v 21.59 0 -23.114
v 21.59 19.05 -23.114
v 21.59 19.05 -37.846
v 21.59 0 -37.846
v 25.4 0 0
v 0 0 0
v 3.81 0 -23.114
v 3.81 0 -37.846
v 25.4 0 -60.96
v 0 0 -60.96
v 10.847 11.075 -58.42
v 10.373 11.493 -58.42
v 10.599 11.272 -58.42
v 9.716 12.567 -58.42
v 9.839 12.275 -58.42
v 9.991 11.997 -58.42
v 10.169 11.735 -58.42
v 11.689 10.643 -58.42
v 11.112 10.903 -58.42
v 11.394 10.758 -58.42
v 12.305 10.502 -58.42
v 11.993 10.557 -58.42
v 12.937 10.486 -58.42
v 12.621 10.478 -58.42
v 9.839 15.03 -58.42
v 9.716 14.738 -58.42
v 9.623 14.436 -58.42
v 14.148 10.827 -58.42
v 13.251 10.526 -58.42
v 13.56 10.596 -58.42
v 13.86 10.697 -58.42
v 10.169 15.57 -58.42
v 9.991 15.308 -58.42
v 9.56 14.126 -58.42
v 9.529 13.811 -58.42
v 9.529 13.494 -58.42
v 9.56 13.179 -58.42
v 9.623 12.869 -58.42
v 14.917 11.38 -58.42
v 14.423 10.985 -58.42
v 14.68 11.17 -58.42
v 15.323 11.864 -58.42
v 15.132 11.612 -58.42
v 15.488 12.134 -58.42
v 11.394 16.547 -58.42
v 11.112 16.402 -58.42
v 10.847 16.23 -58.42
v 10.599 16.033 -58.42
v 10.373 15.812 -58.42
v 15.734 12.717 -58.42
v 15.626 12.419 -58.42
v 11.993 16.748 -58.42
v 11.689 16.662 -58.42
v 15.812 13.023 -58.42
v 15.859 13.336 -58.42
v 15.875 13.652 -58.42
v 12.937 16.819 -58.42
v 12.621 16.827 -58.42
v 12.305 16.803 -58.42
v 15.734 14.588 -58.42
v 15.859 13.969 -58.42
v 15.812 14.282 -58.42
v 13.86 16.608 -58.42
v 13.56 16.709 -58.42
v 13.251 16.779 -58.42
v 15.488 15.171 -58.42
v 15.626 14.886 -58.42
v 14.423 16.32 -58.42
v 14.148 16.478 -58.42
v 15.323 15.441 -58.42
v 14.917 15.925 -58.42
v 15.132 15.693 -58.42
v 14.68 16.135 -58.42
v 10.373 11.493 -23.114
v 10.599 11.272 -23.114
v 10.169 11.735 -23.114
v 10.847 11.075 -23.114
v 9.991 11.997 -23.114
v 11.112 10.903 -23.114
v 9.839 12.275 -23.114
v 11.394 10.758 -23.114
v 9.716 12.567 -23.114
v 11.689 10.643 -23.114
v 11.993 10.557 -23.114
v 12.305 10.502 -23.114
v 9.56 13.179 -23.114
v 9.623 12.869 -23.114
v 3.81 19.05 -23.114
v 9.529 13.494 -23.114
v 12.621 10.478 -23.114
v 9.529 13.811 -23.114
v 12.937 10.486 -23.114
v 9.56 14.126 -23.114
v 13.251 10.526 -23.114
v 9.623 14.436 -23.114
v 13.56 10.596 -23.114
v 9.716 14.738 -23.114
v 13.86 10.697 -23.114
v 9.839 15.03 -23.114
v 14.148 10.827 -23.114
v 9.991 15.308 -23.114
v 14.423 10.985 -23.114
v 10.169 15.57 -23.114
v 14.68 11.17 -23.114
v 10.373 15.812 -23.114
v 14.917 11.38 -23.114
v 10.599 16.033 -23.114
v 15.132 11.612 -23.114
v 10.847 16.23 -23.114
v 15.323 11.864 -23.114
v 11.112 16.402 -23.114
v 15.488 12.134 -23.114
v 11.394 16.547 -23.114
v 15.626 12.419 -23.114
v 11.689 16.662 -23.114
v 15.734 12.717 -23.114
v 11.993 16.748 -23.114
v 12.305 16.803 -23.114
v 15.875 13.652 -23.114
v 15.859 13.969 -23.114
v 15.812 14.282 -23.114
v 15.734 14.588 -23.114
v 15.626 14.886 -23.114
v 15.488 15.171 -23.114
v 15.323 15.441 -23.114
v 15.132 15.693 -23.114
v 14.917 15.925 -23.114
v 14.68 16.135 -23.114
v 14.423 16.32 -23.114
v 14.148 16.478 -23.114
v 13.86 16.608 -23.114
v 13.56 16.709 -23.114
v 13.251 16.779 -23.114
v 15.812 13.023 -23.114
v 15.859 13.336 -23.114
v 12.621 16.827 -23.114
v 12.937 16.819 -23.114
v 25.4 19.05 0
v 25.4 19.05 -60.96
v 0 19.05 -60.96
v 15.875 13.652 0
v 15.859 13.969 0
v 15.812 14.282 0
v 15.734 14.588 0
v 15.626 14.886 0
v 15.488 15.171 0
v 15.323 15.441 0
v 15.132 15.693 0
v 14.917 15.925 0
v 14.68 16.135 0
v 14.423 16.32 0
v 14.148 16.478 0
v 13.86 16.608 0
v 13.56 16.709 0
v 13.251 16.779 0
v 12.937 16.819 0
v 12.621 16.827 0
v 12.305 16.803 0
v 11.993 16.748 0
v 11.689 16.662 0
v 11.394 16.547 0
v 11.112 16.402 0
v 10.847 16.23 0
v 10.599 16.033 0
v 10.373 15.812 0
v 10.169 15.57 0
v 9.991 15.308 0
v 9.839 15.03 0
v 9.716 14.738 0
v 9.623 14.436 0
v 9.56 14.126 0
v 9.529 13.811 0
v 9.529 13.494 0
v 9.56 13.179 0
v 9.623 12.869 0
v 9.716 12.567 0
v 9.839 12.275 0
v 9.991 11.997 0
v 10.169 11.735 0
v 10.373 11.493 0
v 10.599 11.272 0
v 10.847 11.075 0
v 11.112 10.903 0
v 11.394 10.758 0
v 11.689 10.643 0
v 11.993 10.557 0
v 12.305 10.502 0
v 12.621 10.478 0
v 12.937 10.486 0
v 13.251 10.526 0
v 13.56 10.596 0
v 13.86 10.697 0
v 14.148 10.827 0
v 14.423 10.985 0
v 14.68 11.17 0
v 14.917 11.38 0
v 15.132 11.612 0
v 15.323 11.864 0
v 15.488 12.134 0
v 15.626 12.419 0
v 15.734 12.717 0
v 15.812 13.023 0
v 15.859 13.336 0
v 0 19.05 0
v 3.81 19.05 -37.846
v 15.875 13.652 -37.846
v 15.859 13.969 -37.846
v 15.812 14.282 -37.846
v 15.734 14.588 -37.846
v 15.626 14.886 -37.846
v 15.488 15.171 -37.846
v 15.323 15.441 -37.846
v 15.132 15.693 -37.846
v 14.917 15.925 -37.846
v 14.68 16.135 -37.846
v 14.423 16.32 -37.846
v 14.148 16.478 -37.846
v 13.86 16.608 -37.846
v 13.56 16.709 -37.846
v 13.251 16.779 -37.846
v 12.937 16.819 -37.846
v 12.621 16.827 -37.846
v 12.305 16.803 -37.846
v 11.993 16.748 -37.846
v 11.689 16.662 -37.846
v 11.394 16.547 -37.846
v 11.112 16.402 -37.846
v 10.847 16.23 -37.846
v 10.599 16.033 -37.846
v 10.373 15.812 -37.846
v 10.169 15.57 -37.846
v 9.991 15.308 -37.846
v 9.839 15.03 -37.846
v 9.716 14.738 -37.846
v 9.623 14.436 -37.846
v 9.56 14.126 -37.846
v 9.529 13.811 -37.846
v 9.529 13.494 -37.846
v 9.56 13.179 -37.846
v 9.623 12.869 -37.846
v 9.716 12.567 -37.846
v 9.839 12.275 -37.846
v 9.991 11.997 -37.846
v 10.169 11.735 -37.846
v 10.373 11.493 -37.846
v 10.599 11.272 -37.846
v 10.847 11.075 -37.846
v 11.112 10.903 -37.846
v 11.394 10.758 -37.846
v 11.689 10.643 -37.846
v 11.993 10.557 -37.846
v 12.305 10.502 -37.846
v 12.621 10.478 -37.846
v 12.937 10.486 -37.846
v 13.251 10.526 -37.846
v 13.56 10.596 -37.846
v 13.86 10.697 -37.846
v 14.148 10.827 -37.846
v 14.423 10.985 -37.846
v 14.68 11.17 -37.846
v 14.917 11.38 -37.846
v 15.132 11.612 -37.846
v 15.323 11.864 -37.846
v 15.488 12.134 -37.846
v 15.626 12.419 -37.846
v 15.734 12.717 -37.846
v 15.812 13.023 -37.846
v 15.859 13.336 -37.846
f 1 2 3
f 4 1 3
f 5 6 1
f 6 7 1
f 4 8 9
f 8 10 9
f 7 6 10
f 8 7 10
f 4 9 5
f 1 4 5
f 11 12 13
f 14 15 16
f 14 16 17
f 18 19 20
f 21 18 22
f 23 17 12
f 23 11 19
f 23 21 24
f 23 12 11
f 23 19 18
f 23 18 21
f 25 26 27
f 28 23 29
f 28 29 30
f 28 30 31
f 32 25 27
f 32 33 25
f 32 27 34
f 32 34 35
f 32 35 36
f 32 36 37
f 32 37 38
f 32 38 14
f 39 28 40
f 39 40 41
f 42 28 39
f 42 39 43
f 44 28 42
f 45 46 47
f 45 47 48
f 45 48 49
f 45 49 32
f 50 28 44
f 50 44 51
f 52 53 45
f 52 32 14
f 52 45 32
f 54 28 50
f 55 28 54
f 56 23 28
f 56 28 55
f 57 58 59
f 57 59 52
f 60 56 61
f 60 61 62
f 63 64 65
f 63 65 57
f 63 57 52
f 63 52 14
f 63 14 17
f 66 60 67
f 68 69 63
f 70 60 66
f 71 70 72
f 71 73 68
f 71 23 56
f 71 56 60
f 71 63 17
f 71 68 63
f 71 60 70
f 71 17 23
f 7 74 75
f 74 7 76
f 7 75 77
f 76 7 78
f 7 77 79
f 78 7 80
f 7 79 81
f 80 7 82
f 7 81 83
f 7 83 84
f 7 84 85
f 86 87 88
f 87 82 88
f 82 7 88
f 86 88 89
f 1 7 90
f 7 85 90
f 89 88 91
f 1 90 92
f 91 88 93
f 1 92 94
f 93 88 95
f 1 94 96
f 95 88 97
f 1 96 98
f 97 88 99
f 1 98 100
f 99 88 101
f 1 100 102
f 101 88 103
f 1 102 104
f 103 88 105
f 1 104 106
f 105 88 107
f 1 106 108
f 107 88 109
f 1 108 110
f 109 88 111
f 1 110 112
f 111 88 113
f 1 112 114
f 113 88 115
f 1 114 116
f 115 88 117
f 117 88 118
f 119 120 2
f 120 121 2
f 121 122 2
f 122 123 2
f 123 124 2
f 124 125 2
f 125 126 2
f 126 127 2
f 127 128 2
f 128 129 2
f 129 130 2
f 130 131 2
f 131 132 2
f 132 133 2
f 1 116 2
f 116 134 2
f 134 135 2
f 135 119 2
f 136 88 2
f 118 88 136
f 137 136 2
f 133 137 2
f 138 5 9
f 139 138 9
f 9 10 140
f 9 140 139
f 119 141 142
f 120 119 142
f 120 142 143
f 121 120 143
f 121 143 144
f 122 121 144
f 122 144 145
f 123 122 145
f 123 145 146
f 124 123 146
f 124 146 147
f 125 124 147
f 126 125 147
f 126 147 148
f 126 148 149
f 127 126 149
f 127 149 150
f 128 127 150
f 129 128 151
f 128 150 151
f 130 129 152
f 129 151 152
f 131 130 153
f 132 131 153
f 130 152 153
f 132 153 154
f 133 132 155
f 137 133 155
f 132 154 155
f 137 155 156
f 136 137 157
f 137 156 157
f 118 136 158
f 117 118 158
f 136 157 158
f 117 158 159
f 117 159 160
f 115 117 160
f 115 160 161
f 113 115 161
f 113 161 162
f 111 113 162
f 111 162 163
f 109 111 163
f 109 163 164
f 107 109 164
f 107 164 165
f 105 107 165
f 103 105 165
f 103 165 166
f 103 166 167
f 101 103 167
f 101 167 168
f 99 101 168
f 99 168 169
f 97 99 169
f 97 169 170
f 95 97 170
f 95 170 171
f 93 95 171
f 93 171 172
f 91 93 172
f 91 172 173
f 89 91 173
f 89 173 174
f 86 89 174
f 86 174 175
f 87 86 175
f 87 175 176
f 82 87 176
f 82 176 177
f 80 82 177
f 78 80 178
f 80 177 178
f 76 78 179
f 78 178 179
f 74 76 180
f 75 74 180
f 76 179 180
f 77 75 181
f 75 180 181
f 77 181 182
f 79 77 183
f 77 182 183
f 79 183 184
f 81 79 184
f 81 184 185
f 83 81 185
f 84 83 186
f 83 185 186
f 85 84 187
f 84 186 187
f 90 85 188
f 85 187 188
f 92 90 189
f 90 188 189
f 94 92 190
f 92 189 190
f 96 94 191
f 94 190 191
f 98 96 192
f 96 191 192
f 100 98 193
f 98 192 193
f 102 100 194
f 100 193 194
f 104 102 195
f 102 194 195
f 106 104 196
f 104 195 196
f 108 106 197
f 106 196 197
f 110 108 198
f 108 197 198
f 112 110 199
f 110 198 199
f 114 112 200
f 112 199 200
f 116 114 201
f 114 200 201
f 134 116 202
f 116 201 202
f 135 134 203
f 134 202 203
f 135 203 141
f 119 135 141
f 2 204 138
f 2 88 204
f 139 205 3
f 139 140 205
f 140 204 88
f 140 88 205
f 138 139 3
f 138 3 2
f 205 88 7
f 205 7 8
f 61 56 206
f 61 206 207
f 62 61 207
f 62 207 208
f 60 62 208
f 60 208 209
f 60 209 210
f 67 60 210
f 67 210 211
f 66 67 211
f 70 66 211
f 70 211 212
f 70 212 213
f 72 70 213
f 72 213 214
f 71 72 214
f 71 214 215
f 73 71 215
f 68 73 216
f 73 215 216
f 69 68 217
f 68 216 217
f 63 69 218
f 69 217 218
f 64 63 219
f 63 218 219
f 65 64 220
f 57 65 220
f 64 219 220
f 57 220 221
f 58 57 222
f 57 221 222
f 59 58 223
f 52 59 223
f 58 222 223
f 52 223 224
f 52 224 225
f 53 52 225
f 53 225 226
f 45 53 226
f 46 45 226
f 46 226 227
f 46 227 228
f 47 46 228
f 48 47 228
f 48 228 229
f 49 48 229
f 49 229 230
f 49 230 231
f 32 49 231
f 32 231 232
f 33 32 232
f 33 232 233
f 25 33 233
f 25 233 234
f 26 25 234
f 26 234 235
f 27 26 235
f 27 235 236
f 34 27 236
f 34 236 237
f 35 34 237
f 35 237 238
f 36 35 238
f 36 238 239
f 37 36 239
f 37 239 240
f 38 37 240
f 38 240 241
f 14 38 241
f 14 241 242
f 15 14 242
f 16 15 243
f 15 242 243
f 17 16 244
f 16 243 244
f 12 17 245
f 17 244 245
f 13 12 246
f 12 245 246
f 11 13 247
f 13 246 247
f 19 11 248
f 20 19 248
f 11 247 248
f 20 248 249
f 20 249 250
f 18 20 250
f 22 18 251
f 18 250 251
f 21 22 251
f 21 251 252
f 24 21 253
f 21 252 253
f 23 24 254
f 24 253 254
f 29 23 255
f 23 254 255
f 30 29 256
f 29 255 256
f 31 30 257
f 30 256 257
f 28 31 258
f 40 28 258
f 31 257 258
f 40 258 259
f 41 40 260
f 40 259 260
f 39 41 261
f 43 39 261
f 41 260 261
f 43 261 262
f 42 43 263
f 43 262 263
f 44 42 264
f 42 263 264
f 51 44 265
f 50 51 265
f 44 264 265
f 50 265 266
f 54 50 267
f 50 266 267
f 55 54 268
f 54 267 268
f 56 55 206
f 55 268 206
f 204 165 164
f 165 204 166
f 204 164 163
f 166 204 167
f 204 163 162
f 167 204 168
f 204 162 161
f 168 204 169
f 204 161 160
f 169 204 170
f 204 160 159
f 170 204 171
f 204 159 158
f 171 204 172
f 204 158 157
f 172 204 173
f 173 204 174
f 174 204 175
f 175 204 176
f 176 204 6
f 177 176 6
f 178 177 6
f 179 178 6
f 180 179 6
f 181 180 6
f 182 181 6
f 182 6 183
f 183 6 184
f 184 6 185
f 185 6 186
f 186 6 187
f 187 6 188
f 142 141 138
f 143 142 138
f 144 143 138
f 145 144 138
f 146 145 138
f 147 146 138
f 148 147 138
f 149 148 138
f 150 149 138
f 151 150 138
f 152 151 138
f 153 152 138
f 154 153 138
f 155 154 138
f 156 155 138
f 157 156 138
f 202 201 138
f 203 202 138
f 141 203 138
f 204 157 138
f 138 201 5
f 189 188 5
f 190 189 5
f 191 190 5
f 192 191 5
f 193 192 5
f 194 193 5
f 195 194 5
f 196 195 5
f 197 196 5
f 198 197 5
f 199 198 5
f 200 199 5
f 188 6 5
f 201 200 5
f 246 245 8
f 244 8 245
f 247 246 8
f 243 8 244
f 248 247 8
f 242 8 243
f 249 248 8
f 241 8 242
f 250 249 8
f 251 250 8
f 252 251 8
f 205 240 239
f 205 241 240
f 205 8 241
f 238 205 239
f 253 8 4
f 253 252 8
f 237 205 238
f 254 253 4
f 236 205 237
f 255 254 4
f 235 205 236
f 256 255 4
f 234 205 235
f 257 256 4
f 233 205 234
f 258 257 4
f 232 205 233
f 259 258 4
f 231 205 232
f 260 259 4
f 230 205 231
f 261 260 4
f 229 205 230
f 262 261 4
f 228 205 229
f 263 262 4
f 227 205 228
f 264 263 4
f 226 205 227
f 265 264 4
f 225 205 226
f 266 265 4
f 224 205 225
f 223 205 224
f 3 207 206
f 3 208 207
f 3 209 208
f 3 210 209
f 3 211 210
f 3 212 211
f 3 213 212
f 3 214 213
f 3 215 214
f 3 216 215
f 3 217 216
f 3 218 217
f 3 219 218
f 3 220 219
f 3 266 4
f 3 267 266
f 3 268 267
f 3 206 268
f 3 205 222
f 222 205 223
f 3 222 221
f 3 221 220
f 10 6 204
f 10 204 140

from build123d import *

# Parameters (mm, degrees)
SKETCH1_W           = 25.4
SKETCH1_H           = 60.96
BOSS_EXTRUDE1_DEPTH = 19.05
SKETCH3_W           = 17.78
SKETCH3_H           = 14.732
CUT_EXTRUDE1_DEPTH  = 19.05
SKETCH5_R           = 3.175
CUT_EXTRUDE3_DEPTH  = 58.42


with BuildPart() as part:
    # Sketch1 → Boss-Extrude1 (new body)
    with BuildSketch(Plane(origin=(0, 0, 0), x_dir=(1, 0, 0), z_dir=(0, 1, 0))):
        with Locations((12.7, 30.48)):
            Rectangle(SKETCH1_W, SKETCH1_H)
    extrude(amount=BOSS_EXTRUDE1_DEPTH)

    # Sketch3 → Cut-Extrude1 (cut)
    with BuildSketch(Plane(origin=(0, 19.05, 0), x_dir=(1, 0, 0), z_dir=(0, 1, 0))):
        with Locations((12.7, 30.48)):
            Rectangle(SKETCH3_W, SKETCH3_H)
    extrude(amount=-CUT_EXTRUDE1_DEPTH, mode=Mode.SUBTRACT)

    # Sketch5 → Cut-Extrude3 (cut)
    with BuildSketch(Plane.XY):
        with Locations((12.7, 13.6525)):
            Circle(SKETCH5_R)
    extrude(amount=-CUT_EXTRUDE3_DEPTH, mode=Mode.SUBTRACT)


solid = part.part
